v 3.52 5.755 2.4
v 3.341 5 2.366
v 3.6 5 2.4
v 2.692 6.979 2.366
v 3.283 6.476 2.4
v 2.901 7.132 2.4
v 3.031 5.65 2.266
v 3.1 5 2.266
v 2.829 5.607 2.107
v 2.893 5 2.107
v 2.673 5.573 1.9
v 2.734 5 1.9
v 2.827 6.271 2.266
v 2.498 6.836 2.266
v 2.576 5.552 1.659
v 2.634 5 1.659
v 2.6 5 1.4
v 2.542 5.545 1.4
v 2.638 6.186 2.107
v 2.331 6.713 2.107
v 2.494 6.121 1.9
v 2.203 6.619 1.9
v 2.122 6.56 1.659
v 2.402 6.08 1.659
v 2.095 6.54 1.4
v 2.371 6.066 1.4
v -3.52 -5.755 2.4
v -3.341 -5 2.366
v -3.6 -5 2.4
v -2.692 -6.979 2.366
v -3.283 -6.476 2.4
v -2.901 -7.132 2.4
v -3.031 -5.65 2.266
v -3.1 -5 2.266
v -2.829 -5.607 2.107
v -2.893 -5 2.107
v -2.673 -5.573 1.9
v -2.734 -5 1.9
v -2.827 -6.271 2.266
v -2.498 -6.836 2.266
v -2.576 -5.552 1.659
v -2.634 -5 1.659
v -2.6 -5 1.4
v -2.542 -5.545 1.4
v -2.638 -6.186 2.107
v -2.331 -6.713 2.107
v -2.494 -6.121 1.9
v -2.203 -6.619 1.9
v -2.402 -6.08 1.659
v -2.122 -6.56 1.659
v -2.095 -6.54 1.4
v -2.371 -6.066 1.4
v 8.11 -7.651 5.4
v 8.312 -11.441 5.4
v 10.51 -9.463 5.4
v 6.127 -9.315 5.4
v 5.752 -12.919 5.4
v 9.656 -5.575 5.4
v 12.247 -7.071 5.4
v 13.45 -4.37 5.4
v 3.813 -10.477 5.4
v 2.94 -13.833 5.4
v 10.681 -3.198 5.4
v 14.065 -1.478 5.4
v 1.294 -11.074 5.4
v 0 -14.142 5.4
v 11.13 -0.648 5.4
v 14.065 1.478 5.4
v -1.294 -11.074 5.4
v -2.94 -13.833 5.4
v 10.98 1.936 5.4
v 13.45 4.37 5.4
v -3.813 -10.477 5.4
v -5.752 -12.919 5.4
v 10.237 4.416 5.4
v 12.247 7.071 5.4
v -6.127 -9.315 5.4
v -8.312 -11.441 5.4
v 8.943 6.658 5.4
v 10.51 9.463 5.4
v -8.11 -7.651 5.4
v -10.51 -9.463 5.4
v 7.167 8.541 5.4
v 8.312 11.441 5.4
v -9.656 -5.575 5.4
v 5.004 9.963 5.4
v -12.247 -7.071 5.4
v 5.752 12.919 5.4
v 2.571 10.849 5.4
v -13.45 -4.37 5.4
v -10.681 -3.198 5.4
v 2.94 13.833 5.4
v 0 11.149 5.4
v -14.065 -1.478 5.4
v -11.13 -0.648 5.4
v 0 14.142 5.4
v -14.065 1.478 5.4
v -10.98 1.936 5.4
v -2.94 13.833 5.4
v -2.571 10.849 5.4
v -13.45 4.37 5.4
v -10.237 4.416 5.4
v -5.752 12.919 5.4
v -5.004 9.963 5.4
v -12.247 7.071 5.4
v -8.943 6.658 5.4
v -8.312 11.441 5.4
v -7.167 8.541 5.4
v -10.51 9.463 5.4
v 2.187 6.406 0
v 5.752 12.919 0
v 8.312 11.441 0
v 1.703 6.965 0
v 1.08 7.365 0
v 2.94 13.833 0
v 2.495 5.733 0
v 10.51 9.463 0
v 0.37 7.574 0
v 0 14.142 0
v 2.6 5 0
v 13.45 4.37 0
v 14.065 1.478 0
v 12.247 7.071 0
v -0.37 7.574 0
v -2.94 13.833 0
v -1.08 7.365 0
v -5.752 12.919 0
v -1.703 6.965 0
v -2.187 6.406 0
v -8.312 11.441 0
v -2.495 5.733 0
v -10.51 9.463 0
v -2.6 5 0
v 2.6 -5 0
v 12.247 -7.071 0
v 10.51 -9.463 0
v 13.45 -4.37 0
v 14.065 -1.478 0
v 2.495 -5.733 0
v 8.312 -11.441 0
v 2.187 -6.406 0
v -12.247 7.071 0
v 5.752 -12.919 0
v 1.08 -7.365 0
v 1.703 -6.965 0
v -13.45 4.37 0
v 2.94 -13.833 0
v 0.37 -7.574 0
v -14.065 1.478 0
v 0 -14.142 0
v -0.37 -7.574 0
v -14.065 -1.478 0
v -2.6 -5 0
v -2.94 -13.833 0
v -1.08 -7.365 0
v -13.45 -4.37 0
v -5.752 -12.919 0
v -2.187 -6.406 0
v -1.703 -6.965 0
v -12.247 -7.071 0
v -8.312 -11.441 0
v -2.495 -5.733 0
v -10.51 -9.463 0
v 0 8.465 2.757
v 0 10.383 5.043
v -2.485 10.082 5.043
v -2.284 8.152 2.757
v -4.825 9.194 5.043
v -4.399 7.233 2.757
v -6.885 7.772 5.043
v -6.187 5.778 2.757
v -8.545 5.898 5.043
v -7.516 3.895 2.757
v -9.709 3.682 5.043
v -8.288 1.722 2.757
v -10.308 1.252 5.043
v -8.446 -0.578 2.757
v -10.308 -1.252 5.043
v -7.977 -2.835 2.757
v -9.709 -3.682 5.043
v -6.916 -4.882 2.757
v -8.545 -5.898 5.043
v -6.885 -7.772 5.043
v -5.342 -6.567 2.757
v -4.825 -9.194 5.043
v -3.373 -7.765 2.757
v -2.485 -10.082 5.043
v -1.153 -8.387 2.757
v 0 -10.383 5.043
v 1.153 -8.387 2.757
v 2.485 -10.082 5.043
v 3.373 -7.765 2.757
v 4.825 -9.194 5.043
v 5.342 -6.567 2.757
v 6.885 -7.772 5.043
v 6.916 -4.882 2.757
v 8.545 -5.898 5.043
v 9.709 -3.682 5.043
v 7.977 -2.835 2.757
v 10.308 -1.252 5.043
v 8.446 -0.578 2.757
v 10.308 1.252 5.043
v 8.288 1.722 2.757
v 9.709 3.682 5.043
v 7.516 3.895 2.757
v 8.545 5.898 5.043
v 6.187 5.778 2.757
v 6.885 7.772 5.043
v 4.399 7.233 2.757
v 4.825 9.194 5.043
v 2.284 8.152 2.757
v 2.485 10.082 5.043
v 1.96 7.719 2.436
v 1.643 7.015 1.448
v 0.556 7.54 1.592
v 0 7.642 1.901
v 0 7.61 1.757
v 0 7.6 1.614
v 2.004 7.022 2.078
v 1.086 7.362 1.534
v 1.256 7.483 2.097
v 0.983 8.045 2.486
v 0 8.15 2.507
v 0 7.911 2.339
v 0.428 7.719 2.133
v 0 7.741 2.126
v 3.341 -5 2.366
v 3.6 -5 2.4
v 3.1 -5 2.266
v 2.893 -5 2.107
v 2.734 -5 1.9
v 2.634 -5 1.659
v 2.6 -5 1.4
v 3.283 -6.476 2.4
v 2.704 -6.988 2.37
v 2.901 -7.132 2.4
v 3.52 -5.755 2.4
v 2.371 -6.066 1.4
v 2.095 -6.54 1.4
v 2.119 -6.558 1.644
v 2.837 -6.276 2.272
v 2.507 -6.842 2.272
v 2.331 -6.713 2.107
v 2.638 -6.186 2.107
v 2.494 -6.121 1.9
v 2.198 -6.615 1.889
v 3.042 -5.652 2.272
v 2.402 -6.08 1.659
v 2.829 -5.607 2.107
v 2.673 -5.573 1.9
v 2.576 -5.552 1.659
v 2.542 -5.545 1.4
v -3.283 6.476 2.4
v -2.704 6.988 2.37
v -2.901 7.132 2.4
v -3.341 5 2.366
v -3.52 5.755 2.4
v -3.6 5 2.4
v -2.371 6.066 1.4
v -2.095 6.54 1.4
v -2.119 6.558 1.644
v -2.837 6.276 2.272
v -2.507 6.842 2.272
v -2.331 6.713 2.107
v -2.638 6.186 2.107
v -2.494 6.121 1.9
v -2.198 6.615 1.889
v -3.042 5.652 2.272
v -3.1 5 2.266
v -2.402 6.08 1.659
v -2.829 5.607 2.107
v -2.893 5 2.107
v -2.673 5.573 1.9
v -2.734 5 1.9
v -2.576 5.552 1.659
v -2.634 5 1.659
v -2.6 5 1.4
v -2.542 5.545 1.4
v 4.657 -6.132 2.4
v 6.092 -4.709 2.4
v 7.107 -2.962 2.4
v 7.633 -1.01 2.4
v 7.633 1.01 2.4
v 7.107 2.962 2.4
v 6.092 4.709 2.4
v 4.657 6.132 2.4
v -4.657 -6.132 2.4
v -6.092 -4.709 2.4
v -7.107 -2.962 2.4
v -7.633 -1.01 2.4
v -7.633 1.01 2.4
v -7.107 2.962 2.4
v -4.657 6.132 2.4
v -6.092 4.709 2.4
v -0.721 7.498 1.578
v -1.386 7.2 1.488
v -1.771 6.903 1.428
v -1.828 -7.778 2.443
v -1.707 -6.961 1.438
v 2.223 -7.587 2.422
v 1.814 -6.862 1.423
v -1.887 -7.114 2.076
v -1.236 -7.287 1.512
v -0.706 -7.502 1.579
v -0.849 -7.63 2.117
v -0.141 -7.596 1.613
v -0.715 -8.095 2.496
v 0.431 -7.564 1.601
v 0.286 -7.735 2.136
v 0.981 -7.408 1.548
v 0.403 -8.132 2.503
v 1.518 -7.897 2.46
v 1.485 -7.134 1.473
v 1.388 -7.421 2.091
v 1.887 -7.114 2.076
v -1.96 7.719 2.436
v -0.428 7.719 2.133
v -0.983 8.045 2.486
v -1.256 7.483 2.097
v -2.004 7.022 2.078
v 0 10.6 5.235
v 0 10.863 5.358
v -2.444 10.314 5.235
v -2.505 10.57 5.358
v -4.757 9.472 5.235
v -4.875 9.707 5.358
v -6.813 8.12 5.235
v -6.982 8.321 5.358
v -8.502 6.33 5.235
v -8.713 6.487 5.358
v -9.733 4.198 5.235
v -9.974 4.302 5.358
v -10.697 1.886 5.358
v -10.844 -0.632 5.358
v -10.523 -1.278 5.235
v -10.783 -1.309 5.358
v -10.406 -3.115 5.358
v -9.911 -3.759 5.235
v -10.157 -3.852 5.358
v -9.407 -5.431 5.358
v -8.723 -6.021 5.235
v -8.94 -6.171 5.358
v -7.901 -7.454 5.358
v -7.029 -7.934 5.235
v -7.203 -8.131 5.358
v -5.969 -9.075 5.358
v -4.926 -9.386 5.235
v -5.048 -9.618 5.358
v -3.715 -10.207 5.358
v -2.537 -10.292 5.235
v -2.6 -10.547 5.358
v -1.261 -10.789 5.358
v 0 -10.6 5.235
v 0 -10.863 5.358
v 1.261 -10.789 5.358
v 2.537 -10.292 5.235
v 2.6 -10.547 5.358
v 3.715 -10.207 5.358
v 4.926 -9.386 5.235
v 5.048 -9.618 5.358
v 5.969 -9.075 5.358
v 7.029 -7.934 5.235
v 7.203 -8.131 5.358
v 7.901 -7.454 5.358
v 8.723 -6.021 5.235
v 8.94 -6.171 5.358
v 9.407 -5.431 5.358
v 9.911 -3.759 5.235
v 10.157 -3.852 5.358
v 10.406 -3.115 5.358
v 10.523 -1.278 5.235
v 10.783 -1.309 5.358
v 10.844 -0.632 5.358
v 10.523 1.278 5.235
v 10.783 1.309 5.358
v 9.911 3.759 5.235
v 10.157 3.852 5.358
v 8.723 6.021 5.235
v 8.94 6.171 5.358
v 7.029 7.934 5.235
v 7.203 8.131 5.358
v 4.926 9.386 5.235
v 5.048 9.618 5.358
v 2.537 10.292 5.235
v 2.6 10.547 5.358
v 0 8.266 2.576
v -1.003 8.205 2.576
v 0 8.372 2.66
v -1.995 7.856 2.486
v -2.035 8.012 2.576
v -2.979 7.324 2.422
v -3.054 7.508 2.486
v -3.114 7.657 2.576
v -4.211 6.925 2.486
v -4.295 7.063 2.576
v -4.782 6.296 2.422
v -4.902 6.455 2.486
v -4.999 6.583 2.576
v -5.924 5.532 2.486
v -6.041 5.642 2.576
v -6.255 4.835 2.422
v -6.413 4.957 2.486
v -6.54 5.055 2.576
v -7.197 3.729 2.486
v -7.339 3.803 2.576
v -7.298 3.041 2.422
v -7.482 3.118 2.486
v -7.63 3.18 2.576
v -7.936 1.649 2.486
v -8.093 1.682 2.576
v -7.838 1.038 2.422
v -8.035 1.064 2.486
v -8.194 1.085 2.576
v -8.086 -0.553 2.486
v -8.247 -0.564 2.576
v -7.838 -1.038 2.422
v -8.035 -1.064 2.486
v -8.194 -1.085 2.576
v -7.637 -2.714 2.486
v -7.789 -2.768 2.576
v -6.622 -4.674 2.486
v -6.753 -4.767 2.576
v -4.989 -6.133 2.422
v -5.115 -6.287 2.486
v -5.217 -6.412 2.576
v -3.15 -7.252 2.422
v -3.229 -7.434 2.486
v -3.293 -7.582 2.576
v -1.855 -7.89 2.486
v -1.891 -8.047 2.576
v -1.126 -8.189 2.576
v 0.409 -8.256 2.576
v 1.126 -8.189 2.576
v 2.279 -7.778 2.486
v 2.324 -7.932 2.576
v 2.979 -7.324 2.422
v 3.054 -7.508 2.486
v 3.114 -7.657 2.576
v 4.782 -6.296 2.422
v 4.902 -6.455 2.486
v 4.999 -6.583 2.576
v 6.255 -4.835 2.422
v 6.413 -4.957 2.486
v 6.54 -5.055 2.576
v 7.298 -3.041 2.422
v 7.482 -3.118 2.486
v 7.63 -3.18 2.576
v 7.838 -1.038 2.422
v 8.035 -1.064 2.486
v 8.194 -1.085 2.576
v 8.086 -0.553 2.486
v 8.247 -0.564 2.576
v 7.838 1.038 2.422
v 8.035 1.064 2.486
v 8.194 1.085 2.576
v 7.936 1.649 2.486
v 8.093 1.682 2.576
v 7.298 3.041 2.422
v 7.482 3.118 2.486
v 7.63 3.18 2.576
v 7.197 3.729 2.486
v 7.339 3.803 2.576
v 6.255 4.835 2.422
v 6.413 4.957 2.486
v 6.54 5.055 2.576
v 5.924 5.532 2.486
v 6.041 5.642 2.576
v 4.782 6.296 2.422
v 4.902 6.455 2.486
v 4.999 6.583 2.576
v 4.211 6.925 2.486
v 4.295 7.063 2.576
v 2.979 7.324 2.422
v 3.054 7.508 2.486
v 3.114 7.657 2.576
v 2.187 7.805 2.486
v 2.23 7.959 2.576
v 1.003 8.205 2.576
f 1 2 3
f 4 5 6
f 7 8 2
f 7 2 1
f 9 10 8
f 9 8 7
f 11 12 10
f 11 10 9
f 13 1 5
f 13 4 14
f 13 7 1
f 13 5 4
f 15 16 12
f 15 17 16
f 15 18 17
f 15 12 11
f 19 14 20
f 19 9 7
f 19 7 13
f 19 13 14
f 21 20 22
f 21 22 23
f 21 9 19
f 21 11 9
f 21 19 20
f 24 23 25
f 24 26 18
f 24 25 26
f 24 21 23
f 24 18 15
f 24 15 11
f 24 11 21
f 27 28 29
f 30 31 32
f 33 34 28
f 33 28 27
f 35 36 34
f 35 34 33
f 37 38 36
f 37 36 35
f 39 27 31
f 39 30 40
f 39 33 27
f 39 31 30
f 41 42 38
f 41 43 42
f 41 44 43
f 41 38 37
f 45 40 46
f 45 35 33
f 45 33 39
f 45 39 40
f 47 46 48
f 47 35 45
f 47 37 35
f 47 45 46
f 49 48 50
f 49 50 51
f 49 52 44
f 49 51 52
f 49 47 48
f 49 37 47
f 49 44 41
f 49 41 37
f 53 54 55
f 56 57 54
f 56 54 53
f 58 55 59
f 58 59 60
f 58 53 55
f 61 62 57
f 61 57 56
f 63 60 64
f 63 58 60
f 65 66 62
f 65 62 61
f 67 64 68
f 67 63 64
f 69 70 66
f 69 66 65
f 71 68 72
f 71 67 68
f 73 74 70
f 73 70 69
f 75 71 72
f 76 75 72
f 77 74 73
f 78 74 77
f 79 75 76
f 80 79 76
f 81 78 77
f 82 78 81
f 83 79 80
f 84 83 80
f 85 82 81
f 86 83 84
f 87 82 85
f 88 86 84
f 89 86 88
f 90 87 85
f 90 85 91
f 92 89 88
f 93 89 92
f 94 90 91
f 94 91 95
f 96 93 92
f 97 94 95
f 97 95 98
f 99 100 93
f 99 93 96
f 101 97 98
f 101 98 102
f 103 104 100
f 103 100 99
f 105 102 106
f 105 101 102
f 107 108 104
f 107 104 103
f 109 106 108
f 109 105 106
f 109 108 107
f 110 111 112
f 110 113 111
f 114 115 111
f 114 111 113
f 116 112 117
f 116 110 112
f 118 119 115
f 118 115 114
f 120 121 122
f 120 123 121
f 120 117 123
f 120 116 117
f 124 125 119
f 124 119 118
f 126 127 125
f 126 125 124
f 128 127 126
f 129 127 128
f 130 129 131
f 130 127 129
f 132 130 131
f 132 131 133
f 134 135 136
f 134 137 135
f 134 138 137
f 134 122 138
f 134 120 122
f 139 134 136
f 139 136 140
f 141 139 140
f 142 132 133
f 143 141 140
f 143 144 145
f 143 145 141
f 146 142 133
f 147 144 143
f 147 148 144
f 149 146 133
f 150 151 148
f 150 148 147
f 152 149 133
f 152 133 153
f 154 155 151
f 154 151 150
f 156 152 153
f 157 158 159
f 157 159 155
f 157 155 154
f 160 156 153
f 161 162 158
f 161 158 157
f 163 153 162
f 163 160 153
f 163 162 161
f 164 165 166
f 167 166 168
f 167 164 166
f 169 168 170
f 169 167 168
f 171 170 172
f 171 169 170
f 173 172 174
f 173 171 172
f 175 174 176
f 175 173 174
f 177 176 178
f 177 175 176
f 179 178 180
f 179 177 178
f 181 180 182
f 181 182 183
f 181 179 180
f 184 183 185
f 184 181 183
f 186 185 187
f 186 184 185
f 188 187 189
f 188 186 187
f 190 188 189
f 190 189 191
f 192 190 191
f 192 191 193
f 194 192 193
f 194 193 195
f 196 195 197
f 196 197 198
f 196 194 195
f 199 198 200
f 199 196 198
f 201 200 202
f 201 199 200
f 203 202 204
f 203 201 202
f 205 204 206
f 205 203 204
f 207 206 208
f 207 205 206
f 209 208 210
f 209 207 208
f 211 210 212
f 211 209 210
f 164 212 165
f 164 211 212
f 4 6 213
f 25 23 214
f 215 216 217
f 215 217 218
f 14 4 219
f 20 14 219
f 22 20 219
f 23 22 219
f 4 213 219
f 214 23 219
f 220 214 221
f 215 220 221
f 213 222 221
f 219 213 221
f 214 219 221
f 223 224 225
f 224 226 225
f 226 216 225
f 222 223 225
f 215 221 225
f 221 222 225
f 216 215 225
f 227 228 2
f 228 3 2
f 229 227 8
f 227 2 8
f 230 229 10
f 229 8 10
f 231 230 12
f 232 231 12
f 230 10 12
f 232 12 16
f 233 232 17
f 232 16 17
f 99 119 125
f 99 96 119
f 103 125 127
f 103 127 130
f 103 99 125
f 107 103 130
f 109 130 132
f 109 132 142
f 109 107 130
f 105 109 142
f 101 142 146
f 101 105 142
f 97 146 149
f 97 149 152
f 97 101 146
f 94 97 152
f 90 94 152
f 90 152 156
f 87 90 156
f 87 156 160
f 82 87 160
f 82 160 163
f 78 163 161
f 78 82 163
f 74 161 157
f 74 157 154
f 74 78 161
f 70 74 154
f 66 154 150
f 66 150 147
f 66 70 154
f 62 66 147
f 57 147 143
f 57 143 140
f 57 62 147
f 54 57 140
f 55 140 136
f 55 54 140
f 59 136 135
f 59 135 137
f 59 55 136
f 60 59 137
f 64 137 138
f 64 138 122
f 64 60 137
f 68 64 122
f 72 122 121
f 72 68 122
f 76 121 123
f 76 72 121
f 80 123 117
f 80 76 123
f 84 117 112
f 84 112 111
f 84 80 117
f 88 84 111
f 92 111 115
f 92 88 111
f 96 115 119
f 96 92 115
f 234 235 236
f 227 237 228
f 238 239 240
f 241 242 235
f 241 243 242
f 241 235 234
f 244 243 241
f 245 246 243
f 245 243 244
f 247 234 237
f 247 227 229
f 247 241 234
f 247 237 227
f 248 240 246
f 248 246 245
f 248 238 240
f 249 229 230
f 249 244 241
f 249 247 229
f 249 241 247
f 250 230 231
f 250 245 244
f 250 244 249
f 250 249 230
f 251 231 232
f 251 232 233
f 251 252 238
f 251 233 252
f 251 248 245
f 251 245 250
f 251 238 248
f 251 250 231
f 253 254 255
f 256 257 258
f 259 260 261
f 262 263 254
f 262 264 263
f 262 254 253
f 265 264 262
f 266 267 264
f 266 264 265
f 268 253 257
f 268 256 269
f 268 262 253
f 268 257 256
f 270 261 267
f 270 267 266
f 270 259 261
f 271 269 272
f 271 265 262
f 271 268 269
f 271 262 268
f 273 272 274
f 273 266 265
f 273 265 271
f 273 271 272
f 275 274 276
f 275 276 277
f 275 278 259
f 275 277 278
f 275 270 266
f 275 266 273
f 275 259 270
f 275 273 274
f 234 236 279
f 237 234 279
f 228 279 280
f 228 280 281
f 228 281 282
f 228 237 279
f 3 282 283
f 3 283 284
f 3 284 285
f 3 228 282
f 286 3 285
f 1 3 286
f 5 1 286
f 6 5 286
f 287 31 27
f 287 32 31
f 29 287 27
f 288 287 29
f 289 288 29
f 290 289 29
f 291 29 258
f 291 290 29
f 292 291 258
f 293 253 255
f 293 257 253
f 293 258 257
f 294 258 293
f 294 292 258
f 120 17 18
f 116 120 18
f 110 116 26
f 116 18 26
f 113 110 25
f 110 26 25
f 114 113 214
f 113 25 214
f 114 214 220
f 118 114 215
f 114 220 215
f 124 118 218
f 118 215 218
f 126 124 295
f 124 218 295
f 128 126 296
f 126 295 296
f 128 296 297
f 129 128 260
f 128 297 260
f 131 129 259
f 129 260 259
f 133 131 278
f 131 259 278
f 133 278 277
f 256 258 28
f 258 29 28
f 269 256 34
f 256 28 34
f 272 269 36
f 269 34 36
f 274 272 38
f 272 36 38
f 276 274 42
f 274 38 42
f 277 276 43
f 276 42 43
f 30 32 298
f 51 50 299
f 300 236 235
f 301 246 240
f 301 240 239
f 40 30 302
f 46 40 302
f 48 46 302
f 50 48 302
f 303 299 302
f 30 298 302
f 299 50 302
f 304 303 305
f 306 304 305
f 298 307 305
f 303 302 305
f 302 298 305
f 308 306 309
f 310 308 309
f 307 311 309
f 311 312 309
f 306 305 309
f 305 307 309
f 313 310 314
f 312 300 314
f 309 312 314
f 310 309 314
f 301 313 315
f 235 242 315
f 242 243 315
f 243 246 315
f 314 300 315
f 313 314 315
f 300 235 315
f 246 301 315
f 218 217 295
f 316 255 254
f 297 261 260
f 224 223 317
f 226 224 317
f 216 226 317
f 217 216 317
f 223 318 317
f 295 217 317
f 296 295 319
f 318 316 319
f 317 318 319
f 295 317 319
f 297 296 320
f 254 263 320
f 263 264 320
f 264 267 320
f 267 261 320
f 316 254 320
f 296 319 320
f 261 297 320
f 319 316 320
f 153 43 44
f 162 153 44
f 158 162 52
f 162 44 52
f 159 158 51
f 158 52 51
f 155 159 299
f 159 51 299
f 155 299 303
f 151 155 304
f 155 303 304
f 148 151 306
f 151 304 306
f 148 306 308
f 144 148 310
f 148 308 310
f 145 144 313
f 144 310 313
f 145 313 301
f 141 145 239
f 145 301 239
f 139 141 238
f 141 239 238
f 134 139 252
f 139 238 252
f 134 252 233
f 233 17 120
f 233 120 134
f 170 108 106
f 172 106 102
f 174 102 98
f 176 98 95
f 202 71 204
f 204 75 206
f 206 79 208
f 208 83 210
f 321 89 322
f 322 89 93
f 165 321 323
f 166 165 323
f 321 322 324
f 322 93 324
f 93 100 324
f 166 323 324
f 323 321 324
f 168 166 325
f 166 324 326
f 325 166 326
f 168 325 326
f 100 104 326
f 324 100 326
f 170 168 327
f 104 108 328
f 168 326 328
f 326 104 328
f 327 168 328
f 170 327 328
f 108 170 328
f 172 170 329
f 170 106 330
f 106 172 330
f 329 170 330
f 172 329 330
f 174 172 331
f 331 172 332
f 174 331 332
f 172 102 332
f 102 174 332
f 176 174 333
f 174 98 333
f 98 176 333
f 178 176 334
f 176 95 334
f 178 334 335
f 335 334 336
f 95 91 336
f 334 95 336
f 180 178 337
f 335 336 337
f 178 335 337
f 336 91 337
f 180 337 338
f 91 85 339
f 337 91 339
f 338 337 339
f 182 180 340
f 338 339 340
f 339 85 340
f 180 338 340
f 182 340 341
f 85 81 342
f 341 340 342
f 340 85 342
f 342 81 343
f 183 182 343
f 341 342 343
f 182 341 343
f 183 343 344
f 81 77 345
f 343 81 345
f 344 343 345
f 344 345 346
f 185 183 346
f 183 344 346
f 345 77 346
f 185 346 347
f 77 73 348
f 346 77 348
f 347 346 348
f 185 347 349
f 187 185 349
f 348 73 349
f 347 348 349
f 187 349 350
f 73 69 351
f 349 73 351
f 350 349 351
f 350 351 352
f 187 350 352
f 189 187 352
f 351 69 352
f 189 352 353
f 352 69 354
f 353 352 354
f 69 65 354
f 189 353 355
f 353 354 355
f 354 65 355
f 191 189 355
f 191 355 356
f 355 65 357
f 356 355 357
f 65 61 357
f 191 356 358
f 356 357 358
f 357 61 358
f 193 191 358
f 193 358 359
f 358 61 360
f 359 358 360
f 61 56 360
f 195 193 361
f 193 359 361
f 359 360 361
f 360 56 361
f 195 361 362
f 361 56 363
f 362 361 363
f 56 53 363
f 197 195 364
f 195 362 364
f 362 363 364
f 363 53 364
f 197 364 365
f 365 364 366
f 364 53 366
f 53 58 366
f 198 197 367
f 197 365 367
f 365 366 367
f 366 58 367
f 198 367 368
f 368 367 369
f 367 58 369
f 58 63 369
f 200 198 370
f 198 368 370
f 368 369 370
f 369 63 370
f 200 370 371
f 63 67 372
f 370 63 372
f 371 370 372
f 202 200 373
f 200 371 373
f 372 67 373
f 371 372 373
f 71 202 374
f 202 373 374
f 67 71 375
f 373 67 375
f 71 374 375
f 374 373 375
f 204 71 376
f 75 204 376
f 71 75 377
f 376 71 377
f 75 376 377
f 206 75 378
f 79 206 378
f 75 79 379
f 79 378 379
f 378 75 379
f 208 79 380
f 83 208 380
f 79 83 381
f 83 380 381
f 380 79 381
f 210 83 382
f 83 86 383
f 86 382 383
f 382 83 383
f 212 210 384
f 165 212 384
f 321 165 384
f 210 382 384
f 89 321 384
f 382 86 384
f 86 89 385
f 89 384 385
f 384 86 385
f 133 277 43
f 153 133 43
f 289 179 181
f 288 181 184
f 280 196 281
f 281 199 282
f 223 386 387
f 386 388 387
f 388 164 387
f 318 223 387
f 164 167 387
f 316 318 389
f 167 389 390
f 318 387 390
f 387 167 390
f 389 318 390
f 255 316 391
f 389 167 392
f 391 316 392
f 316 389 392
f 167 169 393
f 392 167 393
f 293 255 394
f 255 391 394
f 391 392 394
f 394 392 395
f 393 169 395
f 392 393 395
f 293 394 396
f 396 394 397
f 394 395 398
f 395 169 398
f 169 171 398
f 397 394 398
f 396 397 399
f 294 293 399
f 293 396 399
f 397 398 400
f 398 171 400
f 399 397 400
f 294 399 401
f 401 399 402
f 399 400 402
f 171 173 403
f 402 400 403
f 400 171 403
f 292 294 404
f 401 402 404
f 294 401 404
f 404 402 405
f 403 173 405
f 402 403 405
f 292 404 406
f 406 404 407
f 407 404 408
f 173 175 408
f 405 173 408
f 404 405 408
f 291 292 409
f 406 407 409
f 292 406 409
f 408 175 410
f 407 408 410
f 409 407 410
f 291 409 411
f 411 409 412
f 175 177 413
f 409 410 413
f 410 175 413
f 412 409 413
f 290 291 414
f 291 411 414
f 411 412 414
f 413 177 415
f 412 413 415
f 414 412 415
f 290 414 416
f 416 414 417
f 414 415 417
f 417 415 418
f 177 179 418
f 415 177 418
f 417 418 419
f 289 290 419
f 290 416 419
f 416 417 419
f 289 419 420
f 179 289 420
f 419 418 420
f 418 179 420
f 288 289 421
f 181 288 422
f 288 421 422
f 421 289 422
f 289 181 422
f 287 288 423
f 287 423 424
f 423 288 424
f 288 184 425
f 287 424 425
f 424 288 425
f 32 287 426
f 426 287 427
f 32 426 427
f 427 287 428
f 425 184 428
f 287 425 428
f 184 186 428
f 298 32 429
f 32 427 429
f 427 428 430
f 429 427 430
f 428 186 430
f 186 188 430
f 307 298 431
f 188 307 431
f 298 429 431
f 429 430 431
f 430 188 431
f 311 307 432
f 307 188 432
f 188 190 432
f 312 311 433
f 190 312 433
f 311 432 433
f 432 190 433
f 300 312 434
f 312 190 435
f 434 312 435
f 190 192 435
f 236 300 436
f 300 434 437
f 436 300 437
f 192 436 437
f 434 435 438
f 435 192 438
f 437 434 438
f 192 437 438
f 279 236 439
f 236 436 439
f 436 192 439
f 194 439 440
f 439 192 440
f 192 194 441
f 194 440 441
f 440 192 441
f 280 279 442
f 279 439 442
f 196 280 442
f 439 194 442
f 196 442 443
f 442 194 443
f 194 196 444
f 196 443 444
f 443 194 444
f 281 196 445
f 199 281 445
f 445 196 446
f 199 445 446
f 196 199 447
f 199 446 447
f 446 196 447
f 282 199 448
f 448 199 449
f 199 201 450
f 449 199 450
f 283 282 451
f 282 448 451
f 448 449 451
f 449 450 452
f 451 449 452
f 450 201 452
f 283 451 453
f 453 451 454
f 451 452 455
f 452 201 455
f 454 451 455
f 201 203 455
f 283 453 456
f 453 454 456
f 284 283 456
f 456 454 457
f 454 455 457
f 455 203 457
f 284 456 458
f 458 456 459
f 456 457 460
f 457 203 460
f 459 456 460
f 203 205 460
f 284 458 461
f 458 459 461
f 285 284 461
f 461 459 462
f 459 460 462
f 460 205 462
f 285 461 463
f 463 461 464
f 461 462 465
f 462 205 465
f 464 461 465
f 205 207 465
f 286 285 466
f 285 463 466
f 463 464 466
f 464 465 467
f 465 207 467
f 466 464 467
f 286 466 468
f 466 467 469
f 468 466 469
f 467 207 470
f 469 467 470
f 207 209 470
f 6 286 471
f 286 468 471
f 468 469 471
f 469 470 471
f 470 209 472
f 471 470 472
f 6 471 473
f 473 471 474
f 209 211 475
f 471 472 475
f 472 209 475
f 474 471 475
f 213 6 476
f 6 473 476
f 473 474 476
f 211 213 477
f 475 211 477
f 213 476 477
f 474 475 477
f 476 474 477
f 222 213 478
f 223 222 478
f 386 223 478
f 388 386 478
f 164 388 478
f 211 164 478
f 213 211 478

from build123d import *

# Parameters (mm, degrees)
POCKET_DEPTH = 5
FILLET_R     = 1
FILLET001_R  = 1
FILLET002_R  = 1


with BuildPart() as part:
    # Sketch → Revolution (revolve)
    with BuildSketch(Plane.YZ):
        Polygon((0, 0), (14.142, 0), (14.142, 5.4), (10.683, 5.4), (8.165701, 2.4), (0, 2.4), align=None)
    revolve(axis=Axis((0, 0, 0), (0, 0, 1)))

    # Sketch001 (on Face5 of Revolution) → Pocket (cut)
    with BuildSketch(Plane(origin=(0, 0, 2.4), x_dir=(0, -1, 0), z_dir=(0, 0, 1))):
        with BuildLine():
            Line((-5, 2.6), (5, 2.6))
            ThreePointArc((5, -2.6), (7.6, 0), (5, 2.6))
            Line((-5, -2.6), (5, -2.6))
            ThreePointArc((-5, 2.6), (-7.6, 0), (-5, -2.6))
        make_face()
    extrude(amount=-POCKET_DEPTH, mode=Mode.SUBTRACT)

    # Fillet
    fillet_edges = [part.edges().sort_by_distance(p)[0] for p in [
        (0, -8.165701, 2.4),
    ]]
    fillet(fillet_edges, radius=FILLET_R)

    # Fillet001
    fillet001_edges = [part.edges().sort_by_distance(p)[0] for p in [
        (0, 7.6, 2.4),
    ]]
    fillet(fillet001_edges, radius=FILLET001_R)

    # Fillet002
    fillet002_edges = [part.edges().sort_by_distance(p)[0] for p in [
        (0, -10.683, 5.4),
    ]]
    fillet(fillet002_edges, radius=FILLET002_R)


solid = part.part
